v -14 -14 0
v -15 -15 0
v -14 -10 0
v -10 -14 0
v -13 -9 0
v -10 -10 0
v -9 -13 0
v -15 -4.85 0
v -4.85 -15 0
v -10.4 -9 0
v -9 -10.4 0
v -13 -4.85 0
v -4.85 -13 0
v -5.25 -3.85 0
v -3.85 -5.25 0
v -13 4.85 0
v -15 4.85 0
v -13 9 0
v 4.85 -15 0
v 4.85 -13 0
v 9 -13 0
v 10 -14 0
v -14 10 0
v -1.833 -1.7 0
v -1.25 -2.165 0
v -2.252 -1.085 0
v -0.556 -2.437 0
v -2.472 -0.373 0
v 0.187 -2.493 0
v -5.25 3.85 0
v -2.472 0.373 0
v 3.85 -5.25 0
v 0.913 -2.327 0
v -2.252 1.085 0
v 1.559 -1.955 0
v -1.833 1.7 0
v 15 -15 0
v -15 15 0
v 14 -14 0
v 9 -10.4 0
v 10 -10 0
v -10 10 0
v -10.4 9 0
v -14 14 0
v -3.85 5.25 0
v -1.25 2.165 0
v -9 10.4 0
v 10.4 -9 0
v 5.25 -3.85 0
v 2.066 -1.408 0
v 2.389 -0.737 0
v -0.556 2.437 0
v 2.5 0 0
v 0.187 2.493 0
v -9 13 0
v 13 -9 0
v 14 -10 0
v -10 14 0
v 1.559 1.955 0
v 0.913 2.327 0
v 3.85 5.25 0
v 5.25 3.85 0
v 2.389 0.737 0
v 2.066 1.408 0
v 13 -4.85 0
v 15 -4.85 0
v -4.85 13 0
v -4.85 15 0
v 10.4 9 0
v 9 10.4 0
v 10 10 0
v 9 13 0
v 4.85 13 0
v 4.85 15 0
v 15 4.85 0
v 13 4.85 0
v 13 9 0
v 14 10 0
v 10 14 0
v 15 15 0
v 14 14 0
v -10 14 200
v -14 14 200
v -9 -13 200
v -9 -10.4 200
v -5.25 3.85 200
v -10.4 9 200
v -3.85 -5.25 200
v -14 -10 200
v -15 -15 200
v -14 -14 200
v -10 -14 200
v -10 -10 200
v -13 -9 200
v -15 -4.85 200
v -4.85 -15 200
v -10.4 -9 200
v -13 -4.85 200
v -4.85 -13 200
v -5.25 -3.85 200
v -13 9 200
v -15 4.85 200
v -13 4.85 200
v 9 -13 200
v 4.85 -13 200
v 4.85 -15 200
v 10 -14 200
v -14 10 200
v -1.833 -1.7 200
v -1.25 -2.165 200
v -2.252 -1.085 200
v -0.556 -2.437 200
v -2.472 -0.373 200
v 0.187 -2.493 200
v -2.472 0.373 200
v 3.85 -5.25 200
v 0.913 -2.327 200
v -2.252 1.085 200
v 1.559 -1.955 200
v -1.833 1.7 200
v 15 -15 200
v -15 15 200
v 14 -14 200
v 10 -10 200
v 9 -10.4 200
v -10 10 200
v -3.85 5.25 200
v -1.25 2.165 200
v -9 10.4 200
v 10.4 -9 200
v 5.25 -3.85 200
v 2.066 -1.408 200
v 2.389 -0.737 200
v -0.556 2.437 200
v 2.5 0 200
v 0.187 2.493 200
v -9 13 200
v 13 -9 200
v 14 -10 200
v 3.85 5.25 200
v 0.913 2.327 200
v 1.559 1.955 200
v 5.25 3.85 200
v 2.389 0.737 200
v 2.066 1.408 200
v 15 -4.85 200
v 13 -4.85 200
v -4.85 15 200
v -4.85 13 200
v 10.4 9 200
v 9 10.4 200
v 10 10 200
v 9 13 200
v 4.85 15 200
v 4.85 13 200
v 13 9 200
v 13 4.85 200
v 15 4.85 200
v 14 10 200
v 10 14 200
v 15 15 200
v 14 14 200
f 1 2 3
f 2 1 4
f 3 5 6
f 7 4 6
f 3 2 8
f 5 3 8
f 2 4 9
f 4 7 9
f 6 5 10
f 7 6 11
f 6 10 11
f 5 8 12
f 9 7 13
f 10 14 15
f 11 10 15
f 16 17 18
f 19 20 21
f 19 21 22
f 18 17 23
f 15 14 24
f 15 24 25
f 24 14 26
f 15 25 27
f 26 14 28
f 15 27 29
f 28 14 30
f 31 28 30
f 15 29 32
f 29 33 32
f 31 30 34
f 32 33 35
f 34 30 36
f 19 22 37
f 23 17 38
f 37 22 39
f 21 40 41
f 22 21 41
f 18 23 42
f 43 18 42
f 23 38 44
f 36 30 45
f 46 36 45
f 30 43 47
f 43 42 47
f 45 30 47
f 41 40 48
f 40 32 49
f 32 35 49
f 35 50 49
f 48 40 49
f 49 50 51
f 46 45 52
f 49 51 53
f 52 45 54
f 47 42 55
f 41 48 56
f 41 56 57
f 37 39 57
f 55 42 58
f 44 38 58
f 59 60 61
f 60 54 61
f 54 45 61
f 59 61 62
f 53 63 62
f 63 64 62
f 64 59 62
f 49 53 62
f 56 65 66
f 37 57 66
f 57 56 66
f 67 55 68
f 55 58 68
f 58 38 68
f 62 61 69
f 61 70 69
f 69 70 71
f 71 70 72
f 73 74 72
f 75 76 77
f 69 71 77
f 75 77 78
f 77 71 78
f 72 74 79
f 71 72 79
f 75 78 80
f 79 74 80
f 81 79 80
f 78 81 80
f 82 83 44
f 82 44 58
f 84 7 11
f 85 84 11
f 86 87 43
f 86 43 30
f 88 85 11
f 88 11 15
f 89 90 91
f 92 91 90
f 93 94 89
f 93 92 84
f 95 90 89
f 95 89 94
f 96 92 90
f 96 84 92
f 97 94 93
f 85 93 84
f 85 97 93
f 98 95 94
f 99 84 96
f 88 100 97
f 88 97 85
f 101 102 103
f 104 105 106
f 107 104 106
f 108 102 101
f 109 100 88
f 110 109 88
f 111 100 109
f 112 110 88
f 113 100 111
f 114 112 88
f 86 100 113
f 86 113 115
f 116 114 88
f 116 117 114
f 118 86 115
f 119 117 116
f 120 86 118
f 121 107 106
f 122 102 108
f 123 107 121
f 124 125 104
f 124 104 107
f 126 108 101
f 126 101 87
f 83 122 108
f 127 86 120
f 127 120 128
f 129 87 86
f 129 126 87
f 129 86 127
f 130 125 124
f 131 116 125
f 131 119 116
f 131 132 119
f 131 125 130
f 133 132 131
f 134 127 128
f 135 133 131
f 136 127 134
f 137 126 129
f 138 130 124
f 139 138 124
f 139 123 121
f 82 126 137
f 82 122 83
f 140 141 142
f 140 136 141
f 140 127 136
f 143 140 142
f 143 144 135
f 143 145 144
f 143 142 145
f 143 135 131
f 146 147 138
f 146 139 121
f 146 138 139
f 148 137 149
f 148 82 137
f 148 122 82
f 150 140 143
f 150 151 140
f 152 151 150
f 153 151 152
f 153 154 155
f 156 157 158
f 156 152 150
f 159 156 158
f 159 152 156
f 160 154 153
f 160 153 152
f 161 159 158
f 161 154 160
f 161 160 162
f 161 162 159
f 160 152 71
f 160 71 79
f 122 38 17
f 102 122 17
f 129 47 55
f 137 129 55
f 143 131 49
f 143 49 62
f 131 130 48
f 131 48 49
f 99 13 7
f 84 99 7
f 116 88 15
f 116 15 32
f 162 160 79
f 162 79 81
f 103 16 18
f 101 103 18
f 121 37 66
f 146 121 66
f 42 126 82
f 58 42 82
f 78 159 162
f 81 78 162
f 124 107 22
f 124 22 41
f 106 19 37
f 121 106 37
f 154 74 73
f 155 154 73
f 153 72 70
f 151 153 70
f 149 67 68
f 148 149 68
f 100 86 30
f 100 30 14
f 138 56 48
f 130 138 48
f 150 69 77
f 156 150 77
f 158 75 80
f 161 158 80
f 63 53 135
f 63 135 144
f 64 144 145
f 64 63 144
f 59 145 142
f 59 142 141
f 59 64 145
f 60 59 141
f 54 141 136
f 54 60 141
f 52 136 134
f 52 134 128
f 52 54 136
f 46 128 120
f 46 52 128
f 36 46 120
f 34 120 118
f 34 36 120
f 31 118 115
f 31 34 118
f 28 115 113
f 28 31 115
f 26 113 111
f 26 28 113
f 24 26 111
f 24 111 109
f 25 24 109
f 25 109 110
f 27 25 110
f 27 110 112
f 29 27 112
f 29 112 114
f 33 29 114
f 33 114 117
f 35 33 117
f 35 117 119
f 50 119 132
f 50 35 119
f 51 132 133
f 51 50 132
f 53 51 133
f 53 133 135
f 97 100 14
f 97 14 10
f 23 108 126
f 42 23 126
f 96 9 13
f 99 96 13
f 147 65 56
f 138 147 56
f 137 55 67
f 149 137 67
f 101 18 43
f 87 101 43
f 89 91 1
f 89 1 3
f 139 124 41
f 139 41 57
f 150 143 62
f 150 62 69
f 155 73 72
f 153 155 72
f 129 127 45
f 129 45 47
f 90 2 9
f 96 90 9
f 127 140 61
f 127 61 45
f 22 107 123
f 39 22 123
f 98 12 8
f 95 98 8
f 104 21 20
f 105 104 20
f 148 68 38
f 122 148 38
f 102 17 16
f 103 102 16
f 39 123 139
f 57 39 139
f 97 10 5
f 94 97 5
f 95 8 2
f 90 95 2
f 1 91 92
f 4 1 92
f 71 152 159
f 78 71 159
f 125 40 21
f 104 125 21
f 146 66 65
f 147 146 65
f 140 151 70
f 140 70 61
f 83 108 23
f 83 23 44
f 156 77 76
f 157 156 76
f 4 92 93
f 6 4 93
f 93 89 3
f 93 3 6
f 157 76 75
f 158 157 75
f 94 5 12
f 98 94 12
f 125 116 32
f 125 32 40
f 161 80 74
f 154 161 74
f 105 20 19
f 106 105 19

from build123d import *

# Parameters (mm, degrees)
SKETCH2_R           = 2.5
SKETCH2_W           = 4
SKETCH2_H           = 4
BOSS_EXTRUDE1_DEPTH = 200


with BuildPart() as part:
    # Sketch2 → Boss-Extrude1 (new body)
    with BuildSketch(Plane.XY):
        Polygon((-10.400071427, 9), (-5.25, 3.849928573), (-5.25, 0), (-5.25, -3.849928573), (-10.400071427, -9), (-13, -9), (-13, -4.85), (-15, -4.85), (-15, -9), (-15, -15), (-9, -15), (-4.85, -15), (-4.85, -13), (-9, -13), (-9, -10.400071427), (-3.849928573, -5.25), (0, -5.25), (3.849928573, -5.25), (9, -10.400071427), (9, -13), (4.85, -13), (4.85, -15), (9, -15), (15, -15), (15, -9), (15, -4.85), (13, -4.85), (13, -9), (10.400071427, -9), (5.25, -3.849928573), (5.25, 0), (5.25, 3.849928573), (10.400071427, 9), (13, 9), (13, 4.85), (15, 4.85), (15, 9), (15, 15), (9, 15), (4.85, 15), (4.85, 13), (9, 13), (9, 10.400071427), (3.849928573, 5.25), (0, 5.25), (-3.849928573, 5.25), (-9, 10.400071427), (-9, 13), (-4.85, 13), (-4.85, 15), (-9, 15), (-15, 15), (-15, 9), (-15, 4.85), (-13, 4.85), (-13, 9), align=None)
        Circle(SKETCH2_R, mode=Mode.SUBTRACT)
        with Locations((-12, 12)):
            Rectangle(SKETCH2_W, SKETCH2_H, mode=Mode.SUBTRACT)
        with Locations((12, 12)):
            Rectangle(SKETCH2_W, SKETCH2_H, mode=Mode.SUBTRACT)
        with Locations((12, -12)):
            Rectangle(SKETCH2_W, SKETCH2_H, mode=Mode.SUBTRACT)
        with Locations((-12, -12)):
            Rectangle(SKETCH2_W, SKETCH2_H, mode=Mode.SUBTRACT)
    extrude(amount=BOSS_EXTRUDE1_DEPTH)


solid = part.part
